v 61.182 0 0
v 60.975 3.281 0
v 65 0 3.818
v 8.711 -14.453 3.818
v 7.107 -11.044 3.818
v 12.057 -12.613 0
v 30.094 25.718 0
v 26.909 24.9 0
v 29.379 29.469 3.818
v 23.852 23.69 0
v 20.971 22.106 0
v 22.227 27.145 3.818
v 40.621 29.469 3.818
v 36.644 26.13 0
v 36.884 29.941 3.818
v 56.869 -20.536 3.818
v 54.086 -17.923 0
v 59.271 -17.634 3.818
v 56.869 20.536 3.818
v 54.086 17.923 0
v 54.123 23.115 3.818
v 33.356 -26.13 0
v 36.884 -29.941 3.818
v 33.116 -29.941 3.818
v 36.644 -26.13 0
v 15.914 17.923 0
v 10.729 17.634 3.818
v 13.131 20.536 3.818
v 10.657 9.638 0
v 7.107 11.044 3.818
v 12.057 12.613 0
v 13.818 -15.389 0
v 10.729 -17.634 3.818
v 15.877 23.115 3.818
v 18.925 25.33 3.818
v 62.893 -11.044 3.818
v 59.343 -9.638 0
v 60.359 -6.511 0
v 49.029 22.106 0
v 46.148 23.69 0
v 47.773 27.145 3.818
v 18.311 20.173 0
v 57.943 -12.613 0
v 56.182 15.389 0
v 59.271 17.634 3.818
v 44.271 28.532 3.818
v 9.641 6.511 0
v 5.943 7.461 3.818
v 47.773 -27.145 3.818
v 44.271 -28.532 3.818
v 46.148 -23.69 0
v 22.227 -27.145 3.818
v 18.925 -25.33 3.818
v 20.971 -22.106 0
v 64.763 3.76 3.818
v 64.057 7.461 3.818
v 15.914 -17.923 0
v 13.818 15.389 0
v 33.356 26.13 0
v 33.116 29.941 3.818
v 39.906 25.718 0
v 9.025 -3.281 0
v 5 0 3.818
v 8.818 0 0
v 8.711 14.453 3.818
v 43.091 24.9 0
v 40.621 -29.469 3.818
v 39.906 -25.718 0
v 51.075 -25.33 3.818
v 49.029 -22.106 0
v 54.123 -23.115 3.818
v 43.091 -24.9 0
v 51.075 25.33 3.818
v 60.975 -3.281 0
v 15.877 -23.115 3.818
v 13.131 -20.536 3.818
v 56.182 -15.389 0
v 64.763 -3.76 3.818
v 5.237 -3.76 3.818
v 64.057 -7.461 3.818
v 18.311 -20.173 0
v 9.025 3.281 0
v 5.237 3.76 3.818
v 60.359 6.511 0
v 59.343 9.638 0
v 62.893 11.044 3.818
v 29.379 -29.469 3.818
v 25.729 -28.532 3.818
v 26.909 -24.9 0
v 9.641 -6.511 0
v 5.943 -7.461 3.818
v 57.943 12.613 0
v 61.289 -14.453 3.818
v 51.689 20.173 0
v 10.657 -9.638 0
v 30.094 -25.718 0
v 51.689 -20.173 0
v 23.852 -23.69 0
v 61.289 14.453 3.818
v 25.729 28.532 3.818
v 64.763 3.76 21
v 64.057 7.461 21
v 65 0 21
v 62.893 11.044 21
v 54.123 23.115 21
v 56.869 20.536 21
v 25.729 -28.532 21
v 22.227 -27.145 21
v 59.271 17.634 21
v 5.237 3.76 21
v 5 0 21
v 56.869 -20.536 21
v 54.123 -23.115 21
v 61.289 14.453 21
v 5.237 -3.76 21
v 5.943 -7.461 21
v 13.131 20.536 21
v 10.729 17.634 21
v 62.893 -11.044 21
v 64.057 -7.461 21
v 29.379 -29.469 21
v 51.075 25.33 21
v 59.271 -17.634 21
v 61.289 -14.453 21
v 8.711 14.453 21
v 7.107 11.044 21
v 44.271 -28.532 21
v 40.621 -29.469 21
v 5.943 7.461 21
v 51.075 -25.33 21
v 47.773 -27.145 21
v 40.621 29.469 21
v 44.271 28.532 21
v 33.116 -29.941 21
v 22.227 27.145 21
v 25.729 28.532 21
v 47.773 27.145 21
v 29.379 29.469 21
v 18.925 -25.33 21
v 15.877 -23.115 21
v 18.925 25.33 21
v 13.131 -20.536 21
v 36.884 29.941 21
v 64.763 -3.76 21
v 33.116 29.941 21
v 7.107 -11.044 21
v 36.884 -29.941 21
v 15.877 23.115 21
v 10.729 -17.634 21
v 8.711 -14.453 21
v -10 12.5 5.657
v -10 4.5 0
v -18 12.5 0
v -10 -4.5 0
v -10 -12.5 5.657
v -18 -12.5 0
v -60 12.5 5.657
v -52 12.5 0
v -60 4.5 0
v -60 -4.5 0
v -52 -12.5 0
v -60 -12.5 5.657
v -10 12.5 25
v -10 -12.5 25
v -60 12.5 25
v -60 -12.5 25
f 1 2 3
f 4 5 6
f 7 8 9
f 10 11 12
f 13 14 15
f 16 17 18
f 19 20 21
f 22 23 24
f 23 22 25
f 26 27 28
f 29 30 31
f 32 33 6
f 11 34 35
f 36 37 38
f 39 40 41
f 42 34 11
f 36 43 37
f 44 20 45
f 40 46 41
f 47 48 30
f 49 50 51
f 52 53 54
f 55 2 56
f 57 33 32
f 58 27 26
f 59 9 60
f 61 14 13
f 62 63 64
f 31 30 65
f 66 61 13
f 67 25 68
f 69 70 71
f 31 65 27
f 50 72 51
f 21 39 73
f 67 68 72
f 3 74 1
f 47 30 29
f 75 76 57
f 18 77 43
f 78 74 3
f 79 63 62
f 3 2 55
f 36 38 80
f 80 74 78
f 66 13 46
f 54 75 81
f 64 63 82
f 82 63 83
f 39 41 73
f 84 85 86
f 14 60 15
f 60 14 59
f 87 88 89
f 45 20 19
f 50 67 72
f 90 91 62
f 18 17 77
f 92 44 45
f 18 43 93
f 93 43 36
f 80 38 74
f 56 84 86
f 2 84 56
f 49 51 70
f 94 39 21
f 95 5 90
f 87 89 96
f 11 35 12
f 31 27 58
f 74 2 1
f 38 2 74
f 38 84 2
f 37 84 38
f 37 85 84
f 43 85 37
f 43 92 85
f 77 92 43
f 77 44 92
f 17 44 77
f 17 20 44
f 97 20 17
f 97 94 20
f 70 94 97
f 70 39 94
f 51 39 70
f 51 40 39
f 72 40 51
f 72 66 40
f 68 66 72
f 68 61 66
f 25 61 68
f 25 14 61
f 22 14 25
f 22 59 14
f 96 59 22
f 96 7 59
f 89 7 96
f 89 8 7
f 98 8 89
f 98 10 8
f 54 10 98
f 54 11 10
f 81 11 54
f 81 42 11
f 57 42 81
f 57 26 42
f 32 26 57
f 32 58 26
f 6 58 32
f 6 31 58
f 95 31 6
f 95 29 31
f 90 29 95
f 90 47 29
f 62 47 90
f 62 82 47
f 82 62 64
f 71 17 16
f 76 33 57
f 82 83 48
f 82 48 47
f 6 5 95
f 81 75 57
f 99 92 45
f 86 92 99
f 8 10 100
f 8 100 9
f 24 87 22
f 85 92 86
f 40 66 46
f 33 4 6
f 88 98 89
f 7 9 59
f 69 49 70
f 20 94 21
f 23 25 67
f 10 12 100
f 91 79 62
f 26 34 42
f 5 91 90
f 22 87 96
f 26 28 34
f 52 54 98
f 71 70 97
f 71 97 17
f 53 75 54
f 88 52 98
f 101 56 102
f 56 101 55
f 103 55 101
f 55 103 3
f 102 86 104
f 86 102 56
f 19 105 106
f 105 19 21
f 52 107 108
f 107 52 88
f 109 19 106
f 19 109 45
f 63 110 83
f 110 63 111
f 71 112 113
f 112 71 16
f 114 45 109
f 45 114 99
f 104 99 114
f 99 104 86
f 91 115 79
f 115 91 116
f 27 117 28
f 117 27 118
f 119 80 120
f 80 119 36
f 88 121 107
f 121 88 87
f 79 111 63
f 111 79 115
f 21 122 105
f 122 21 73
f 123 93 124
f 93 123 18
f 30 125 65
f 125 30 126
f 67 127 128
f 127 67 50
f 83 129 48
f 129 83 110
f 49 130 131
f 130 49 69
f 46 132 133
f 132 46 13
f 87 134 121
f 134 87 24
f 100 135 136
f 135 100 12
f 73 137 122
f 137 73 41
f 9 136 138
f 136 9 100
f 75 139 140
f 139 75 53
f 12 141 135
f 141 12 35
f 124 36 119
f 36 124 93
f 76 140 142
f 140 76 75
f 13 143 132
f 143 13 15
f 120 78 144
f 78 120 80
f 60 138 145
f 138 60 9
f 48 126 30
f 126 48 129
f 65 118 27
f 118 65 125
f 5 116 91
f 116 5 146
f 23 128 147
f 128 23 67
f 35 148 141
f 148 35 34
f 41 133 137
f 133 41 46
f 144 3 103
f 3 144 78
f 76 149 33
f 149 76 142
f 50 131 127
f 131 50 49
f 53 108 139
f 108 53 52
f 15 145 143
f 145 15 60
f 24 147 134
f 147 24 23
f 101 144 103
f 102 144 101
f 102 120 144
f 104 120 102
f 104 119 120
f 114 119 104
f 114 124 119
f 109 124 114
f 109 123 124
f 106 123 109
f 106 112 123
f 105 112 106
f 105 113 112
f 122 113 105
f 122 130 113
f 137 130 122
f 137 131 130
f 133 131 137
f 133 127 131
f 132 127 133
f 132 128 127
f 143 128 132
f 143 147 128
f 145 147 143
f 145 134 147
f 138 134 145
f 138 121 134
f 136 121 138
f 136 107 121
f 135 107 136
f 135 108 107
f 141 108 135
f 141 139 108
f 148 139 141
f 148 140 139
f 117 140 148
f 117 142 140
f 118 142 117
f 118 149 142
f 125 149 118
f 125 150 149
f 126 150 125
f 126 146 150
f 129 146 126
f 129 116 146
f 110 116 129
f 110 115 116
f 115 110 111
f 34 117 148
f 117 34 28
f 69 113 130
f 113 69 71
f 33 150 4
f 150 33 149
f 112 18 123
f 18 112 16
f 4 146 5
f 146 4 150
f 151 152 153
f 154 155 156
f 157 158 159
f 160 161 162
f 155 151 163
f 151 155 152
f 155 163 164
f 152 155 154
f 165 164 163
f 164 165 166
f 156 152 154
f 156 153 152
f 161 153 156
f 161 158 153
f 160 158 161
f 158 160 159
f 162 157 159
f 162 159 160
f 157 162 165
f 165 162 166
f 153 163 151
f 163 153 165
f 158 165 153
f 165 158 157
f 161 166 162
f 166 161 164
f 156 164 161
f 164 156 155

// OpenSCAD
// file: ../utilities/transformations_oblomobka.scad
// Transformations
// (C) @oblomobka - 2014
// GPL3

// Transforma una forma en un sector según un ángulo dado.

module sector(	angle, 	// es el ángulo del sector, lo que quedará de la forma original
				d,		// valor auxiliar, será como mínimo igual al diámetro del cilindro que envuelve la forma original
				h		// valor auxiliar, será como mínimo igual a la altura del cilindro que envuelve la forma original
				){

POINTS=[	[0,0,-h],
		[0,0,h],
		[d*cos(0*angle/4),d*sin(0*angle/4),-h],
		[d*cos(0*angle/4),d*sin(0*angle/4),h],
		[d*cos(1*angle/4),d*sin(1*angle/4),-h],
		[d*cos(1*angle/4),d*sin(1*angle/4),h],
		[d*cos(2*angle/4),d*sin(2*angle/4),-h],
		[d*cos(2*angle/4),d*sin(2*angle/4),h],
		[d*cos(3*angle/4),d*sin(3*angle/4),-h],
		[d*cos(3*angle/4),d*sin(3*angle/4),h],
		[d*cos(4*angle/4),d*sin(4*angle/4),-h],
		[d*cos(4*angle/4),d*sin(4*angle/4),h],
		];

TRIANGLES=[	[0,1,2],
			[1,3,2],
			[2,3,4],
			[3,5,4],
			[4,5,6],
			[5,7,6],
			[6,7,8],
			[7,9,8],
			[8,9,10],
			[9,11,10],
			[10,11,0],
			[11,1,0],

			[5,3,1],
			[7,5,1],
			[9,7,1],
			[11,9,1],
			[0,2,4],
			[0,4,6],
			[0,6,8],
			[0,8,10]
			];

if(angle<=0 || angle>=360){
	child();
	}
	else{
		intersection(){
			polyhedron(points=POINTS,triangles=TRIANGLES);
			child();
			}
		}
}

//sector (150,40,10)cylinder(r=20,h=10); // Ejemplo de uso de la tansformación sector()
// file: ../utilities/functions_ext.scad
// Funciones sacadas de otras librerías y de diferentes autores

include <constants_oblomobka.scad>

/* A circular helix of radius a and pitch 2πb is described by the following parametrisation:
x(t) = a*cos(t),
y(t) = a*sin(t),
z(t) = b*t
Licensed under the MIT license.
© 2010 by Elmo Mäntynen
*/
function b(pitch) = pitch/(TAU);
function t(pitch, z) = z/b(pitch);
function helix_curve(pitch, radius, z) = [radius*cos(deg(t(pitch, z))), radius*sin(deg(t(pitch, z))), z];


/* Utility functions.
 * Originally by Hans Häggström, 2010.
 * Dual licenced under Creative Commons Attribution-Share Alike 3.0 and LGPL2 or later
 */
function distance(a, b) = sqrt( (a[0] - b[0])*(a[0] - b[0]) +
                                (a[1] - b[1])*(a[1] - b[1]) +
                                (a[2] - b[2])*(a[2] - b[2]) );

function length2(a) = sqrt( a[0]*a[0] + a[1]*a[1] );

function normalized(a) = a / (max(distance([0,0,0], a), 0.00001));

function normalized_axis(a) = 	a == "x" ? [1, 0, 0]:
                  			 	a == "y" ? [0, 1, 0]:
                   				a == "z" ? [0, 0, 1]: normalized(a);

function angleOfNormalizedVector(n) = [0, -atan2(n[2], length2([n[0], n[1]])), atan2(n[1], n[0]) ];

function angle(v) = angleOfNormalizedVector(normalized(v));

function angleBetweenTwoPoints(a, b) = angle(normalized(b-a));
// file: ../utilities/constants_oblomobka.scad
// números transcendentes

TAU = 2*PI; //6.2831853071 (PI ya está definido en Openscad)
EULER=2.71828282;


// números algebraicos

PHI=(1+sqrt(5))/2;


// Vectores

X = [1, 0, 0];
Y = [0, 1, 0];
Z = [0, 0, 1];
// file: ../utilities/shapes_oblomobka.scad
// Shapes
// (C) @oblomobka - 2014
// GPL3

include <constants_oblomobka.scad>
include <functions_oblomobka.scad>
include <functions_ext.scad>

use <transformations_oblomobka.scad>

// --- Piramide con base circunscrita en un círculo definido en las variables
module pyramid_circumscribed (	n=4,			// nº lados de la base de la pirámide	
								d1=20,		// diámetro del círculo-base donde se circunscribe la pirámide
								d2=0,		// diámetro del círculo-punta donde se circunscribe la pirámide
								h=10			// altura de la pirámide
								){

if(n%2==0){
	rotate([0,0,180/n])
		cylinder (r1=d1/2/cos(180/n), r2=d2/2/cos(180/n), h=h, $fn=n);
	}
	else{
		rotate([0,0,90/n])
			cylinder (r1=d1/2/cos(180/n), r2=d2/2/cos(180/n), h=h, $fn=n);
		}

}
// ------- pyramid_circumscribed (n=n,d1=d1,d2=d2,h=h); -----------------

// --- Prisma con base circunscrita en un círculo definido en las variables
module prism_circumscribed (	n=4,			// nº lados de la base del prisma
							d=20,		// diámetro del círculo donde se circunscribe el prisma
							h=10			// altura del prisma
							){
if(n%2==0){
	rotate([0,0,180/n])
		cylinder (r=d/2/cos(180/n), h=h, $fn=n);
	}
	else{
		rotate([0,0,90/n])
			cylinder (r=d/2/cos(180/n), h=h, $fn=n);
		}
}
// ------- prism_circumscribed (n=n,d=d,h=h); -----------------



// Toros

// Definido por el diámetro exterior y el diámetro del círculo en revolución
module torusOD (d1,d2,resolution){
$fn=resolution;	
rotate_extrude(){
	translate([d1/2-d2/2,0,0])
		circle(r=d2/2);
	}
}

// Definido por el diámetro exterior y el diámetro interior
module torusOI (d1,d2,resolution){
$fn=resolution;	
d=(d1-d2)/2;
rotate_extrude(){
	translate([d1/2-d/2,0,0])
		circle(r=d/2);
	}
}

// Definido por el diámetro de la línea neutra y el diámetro del círculo en revolución
module torusND (d1,d2,resolution){
$fn=resolution;	
rotate_extrude(){
	translate([d1/2,0,0])
		circle(r=d2/2);
	}
}

module torus_sector(d1,d2,angle=360,mode=1,extreme=true,resolution=32){

if(angle<=0 || angle>=360){
	if(mode==1){torusOD(d1,d2,resolution=resolution);}
	else{if(mode==2){torusND(d1,d2,resolution=resolution);}
	else{if(mode==3){torusOI(d1,d2,resolution=resolution);}}}
	}

else{
	if(mode==1){
		union(){
			sector(angle,d1,d2/2)torusOD(d1,d2,resolution=resolution);
			if(extreme==true){
				translate([d1/2-d2/2,0,0])sphere(d2/2,$fn=resolution);
				translate([(d1/2-d2/2)*cos(angle),(d1/2-d2/2)*sin(angle),0])sphere(d2/2,$fn=resolution);
				}
			}
		}
	else{
		if(mode==2){
			union(){
				sector(angle,d1+d2,d2/2)torusND(d1,d2,resolution=resolution);
				if(extreme==true){
					translate([d1/2,0,0])sphere(d2/2,$fn=resolution);
					translate([d1/2*cos(angle),d1/2*sin(angle),0])sphere(d2/2,$fn=resolution);
					}
				}
			}
		else{
			if(mode==3){
				union(){
					sector(angle,d1,(d1-d2)/4)torusOI(d1,d2,resolution=resolution);
					if(extreme==true){
						translate([d1/2-(d1-d2)/4,0,0])sphere((d1-d2)/4,$fn=resolution);
						translate([(d1/2-(d1-d2)/4)*cos(angle),(d1/2-(d1-d2)/4)*sin(angle),0])sphere((d1-d2)/4,$fn=resolution);
						}
					}
				}
			}
		}
	}
}


// Tubos

module tubeOT (d,t,h,resolution=resolution){	
	difference(){
		cylinder(r=d/2,h=h,$fn=resolution);
		cylinder(r=(d-2*t)/2,h=3*h,center=true,$fn=resolution);
		}
}

// Definido por el diámetro exterior y el diámetro interior
module tubeOI (d1,d2,h,resolution=resolution){
	difference(){
		cylinder(r=d1/2,h=h,$fn=resolution);
		cylinder(r=d2/2,h=3*h,center=true,$fn=resolution);	
		}
}

// Definido por el diámetro de la línea neutra y el diámetro del círculo en revolución
module tubeNT (d,t,h,resolution=resolution){
	difference(){
		cylinder(r=(d+t)/2,h=h,$fn=resolution);
		cylinder(r=(d-t)/2,h=3*h,center=true,$fn=resolution);
	}
}

module tube_sector(d=25,t=2,h=1,angle=360,mode=1,extreme=true,resolution=32){

if(angle<=0 || angle>=360){
	if(mode==1){tubeOT(d,t,h,resolution=resolution);}
	else{if(mode==2){tubeNT(d,t,h,resolution=resolution);}
	else{if(mode==3){tubeOI(d,t,h,resolution=resolution);}}}
	}

else{
	if(mode==1){
		union(){
			sector(angle,d,h)tubeOT(d,t,h,resolution=resolution);
			if(extreme==true){
				translate([d/2-t/2,0,0])cylinder(r=t/2,h=h,$fn=resolution);
				translate([(d/2-t/2)*cos(angle),(d/2-t/2)*sin(angle),0])cylinder(r=t/2,h=h,$fn=resolution);;
				}
			}
		}
	else{
		if(mode==2){
			union(){
				sector(angle,d+t,h)tubeNT(d,t,h,resolution=resolution);
				if(extreme==true){
					translate([d/2,0,0])cylinder(r=t/2,h=h,$fn=resolution);
					translate([d/2*cos(angle),d/2*sin(angle),0])cylinder(r=t/2,h=h,$fn=resolution);
					}
				}
			}
		else{
			if(mode==3){
				union(){
					sector(angle,d,h)tubeOI(d,t,h,resolution=resolution);
					if(extreme==true){
						translate([d/2-(d-t)/4,0,0])cylinder(r=(d-t)/4,h=h,$fn=resolution);
						translate([(d/2-(d-t)/4)*cos(angle),(d/2-(d-t)/4)*sin(angle),0])cylinder(r=(d-t)/4,h=h,$fn=resolution);
						}
					}
				}
			}
		}
	}
}

//torus_sector(d1=15,d2=4,angle=215,mode=3,extreme=true,resolution=50);
//tube_sector(d=24,t=11,h=15,angle=250,mode=1,extreme=true,resolution=50);

pyramid_circumscribed(n=10,d=8,h=4);
// file: ../utilities/functions_oblomobka.scad
// Functions
// (C) @oblomobka - 2014
// GPL3

include <constants_oblomobka.scad>

// da el diámetro interior del cono(d1,d2,h) a una altura interior(hi) conocida
function di_cone(d1,d2,h,hi)=d2+(d1-d2)*(1-hi/h);

// da la altura interior del cono(d1,d2,h) a un diametro(di) conocido
function hi_cone(d1,d2,h,di)=-h*((di-d2)/(d1-d2)-1);

// 
function r_circle_intersection (d1,d2)=sqrt(pow(d1/2,2)-pow(d2/2,2));

// Relaciones entre radio, apotema y lado en un polígono de n lados
function side_apothem (apothem,n)=apothem*2*tan(180/n);
function apothem_radius(radius,n)=radius*cos(180/n);
function radius_apothem(apothem,n)=apothem/cos(180/n);
function side_radius (radius,n)=radius*2*sin(180/n);

// limita los posibles valores de x, que siempre estarán comprendidos entre un minimo(a) y un maximo(z)
function lim(a,x,z)=max(a,min(x,z));

// transforma angulo, radianes --> hexadecimal
function deg(angle) = 180*angle/PI;
// transforma angulo, hexadecimal --> radianes
function rad(angle) = angle*PI/180;
// file: ../utilities/limits_oblobots.scad
//PIN
	d_pin_minmax=[10,30];			//	d_pin=lim(d_pin_minmax[0],pin[0],d_pin_minmax[1]);			
	h_pin_minmax=[0,10];			//	h_pin=lim(h_pin_minmax[0],pin[1],h_pin_minmax[1]);

//LEGS & FOOTS
	d_leg_minmax=[10,30];			//	d_leg=lim(d_leg_minmax[0],leg[0],d_leg_minmax[1]);
	h_leg_minmax=[20,90];			//	h_leg=lim(h_leg_minmax[0],leg[1],h_leg_minmax[1]);	
	n_leg_minmax=[4,16];			//	n_leg=lim(n_leg_minmax[0],leg[2],n_leg_minmax[1]);
	legsposition_minmax=[0,100];	// 	legsposition=lim(legsposition_minmax[0],leg[1],legsposition_minmax[1]);

	l_foot_minmax=[24,70];		//	l_foot=lim(l_foot_minmax[0],foot[0],l_foot_minmax[1]);
	h_foot_minmax=[0,40];			//	h_foot=lim(h_foot_minmax[0],foot[1],h_foot_minmax[1]);

//HIP | WAIST
	//C
	d_hip_minmax=[25,80];			//	d_hip=lim(d_hip_minmax[0],hip[0],d_hip_minmax[1]);
	h_hip_minmax=[10,70];			//	h_hip=lim(h_pin+2,hip[1],h_hip_minmax[1]);
	f_hip_minmax=[0,100];			//	f_hip=lim(f_hip_minmax[0],hip[2],f_hip_minmax[1]);

								//	d1_waist=lim(d_pin,waist[0],d_hip);
								//	d2_waist=lim(d_pin,waist[1],d1_waist);
	h_waist_minmax=[0.3,20];		//	h_waist=lim(h_waist_minmax[0],waist[2],h_waist_minmax[1]);

	
	//Q
	x_hip_minmax=[20,90];			//	x_hip=lim(x_hip_minmax[0],hip[0],x_hip_minmax[1]);
	y_hip_minmax=[20,60];			//	y_hip=lim(y_hip_minmax[0],hip[1],y_hip_minmax[1]);
	z_hip_minmax=[10,60];			//	z_hip=lim(z_hip_minmax[0],hip[2],z_hip_minmax[1]);
	bevel_hip_minmax=[0.5,20];	//	bevel_hip=lim(bevel_hip_minmax[0],hip[3],bevel_hip_minmax[1]);

	n_waist_minmax=[4,50];		//	n_waist=lim(n_waist_minmax[0],waist[3],n_waist_minmax[1]);
								//	d1_waist=lim(d_pin,waist[0],min(x_hip,y_hip));
								//	d2_waist=lim(d_pin,waist[1],d1_waist);


//TRUNK | SHOULDER | NECK
	//C
	d1_trunk_minmax=[30,100];		//	d1_trunk=lim(d1_trunk_minmax[0],trunk[0],d1_trunk_minmax[1]); 
	d2_trunk_minmax=[30,100];		//	d2_trunk=lim(d2_trunk_minmax[0],trunk[1],d1_trunk);
	h_trunk_minmax=[24,100];		//	h_trunk=lim(h_trunk_minmax[0],trunk[2],h_trunk_minmax[1]);

	d1_shoulder_minmax=[12,50];	//	d1_shoulder=lim(d1_shoulder_minmax[0],shoulder[0],h_trunk*sin(angle_trunk));
	d_aux_shoulder_minmax=[0,10];	//	d_aux_shoulder=lim(d_aux_shoulder_minmax[0],shoulder[1],d_aux_shoulder_minmax[1]);
	h_shoulder_minmax=[0,50];		//	h_shoulder=lim(h_shoulder_minmax[0],shoulder[2],d2_trunk/2);

								//	d1_neck=lim(d_pin+2,neck[0],d2_trunk);
								//	d2_neck=lim(d_pin+2,neck[1],d1_neck);
	h_neck_minmax=[0.3,20];		//	h_neck=lim(h_neck_minmax[0],neck[2],h_neck_minmax[1]);

	//Q
	x_trunk_minmax=[20,90];		//	x_trunk=lim(x_trunk_minmax[0],trunk[0],x_trunk_minmax[1]);
	y_trunk_minmax=[20,90];		//	y_trunk=lim(d_pin+1+x_trunk/5,trunk[1],y_trunk_minmax[1]);
	z_trunk_minmax=[26,90];		//	z_trunk=lim(z_trunk_minmax[0],trunk[2],z_trunk_minmax[1]);
	
	n_neck_minmax=[4,50];			//	n_neck=lim(n_neck_minmax[0],neck[3],n_neck_minmax[1]);
								//	d1_neck=lim(d_pin+2,neck[0],min(x_trunk,y_trunk));	
								//	d2_neck=lim(d_pin+2,neck[1],d1_neck);

	//ELECTRIC TRUNK
	d_polygonal_trunk_minmax=[45,80];	//d_polygonal_trunk=lim(d_polygonal_trunk_minmax[0],trunk[0],d_polygonal_trunk_minmax[1]);							
	h_polygonal_trunk_minmax=[87,120];	//h_polygonal_trunk=lim(h_polygonal_trunk_minmax[0],trunk[1],h_polygonal_trunk_minmax[1]);
	thickness_trunk_minmax=[1,6];	//thickness_trunk=lim(thickness_trunk_minmax[0],trunk[2],thickness_trunk_minmax[1]);

// ARMS | HANDS
	// C
	d_arm_minmax=[10,40];			// 	d_arm=lim(d_arm_minmax[0],arm[0],d_arm_minmax[1]);
								//	d_arm=lim(d_pin+1,arm[0],d_arm_minmax[1]);	
	h_arm_minmax=[5,25];			// 	h_arm=lim(h_arm_minmax[0],arm[1],h_arm_minmax[1]);
	armpit_minmax=[0.3,60];		//	armpit=lim(armpit_minmax[0],arm[2],armpit_minmax[1]);
	l_arm_minmax=[20,120];		// 	l_arm=lim(d_arm+d_hand,arm[2],l_arm_minmax[1]);	

	d_hand_minmax=[10,60];		//	d_hand=lim(d_hand_minmax[0],hand[0],d_hand_minmax[1]);
	h_hand_minmax=[3,25];			//	h_hand=lim(h_hand_minmax[0],hand[1],h_arm-0.5);
	angle_hand_minmax=[0,180];	//	angle_hand=lim(angle_hand_minmax[0],hand[2]/2,angle_hand_minmax[1]);

	// Q
	x_arm_minmax=[5,25];			// 	x_arm=lim(x_arm_minmax[0],arm[1],x_arm_minmax[1]);
	y_arm_minmax=[10,40];			// 	y_arm=lim(y_arm_minmax[0],arm[0],y_arm_minmax[1]);
	z_arm_minmax=[20,120];		//	z_arm=lim(y_arm+5+d_hand,arm[2],z_arm_minmax[1]);

	n_hand_minmax=[4,12];			// 	n_hand=lim(n_hand_minmax[0],2*floor(hand[2]/2),n_hand_minmax[1]);
								//	h_hand=lim(h_hand_minmax[0],hand[1],x_arm-0.5);

// HEAD | EYES | BRAIN
	// C
	h_head_minmax=[20,100];		// 	h_head=lim(h_head_minmax[0],head[2],h_head_minmax[1]);
	d1_head_minmax=[20,60];		// 	d1_head=lim(h_head_minmax[0],head[0],h_head_minmax[1]);
	d2_head_minmax=[15,150];		// 	d2_head=lim(h_head_minmax[0],head[1],2*h_head+d1_head);

	// Q
	x_head_minmax=[20,100];		// x_head=lim(x_head_minmax[0],head[0],x_head_minmax[1]);
	y_head_minmax=[20,100];		// y_head=lim(y_head_minmax[0],head[1],y_head_minmax[1]);
	z_head_minmax=[20,100];		// z_head=lim(z_head_minmax[0],head[2],z_head_minmax[1]);

	d_eye_minmax=[5,40];			// 	d_eye=lim(d_eye_minmax[0],eye[0],(d1_head+d2_head)/2);
	h_eye_minmax=[1,10];			// 	h_eye=lim(h_eye_minmax[0],eye[1],h_eye_minmax[1]);
	edge_eye_minmax=[1,12];		//	edge_eye=lim(edge_eye_minmax[0],eye[2],d_eye/2-3);

	frown_eye_expression_minmax=[0,100];		// frown_eye_expression=lim(frown_eye_expression_minmax[0],eye_expression[1],frown_eye_expression_minmax[1]);
	bridge_eye_position_minmax=[0,100];		// bridge_eye_position=lim(bridge_eye_position_minmax[0],eye_position[0],bridge_eye_position_minmax[1]);	
	f_h_eye_position_minmax=[0,100];			// f_h_eye_position=lim(f_h_eye_position_minmax[0],eye_position[1],f_h_eye_position_minmax[1]);	

	h_brain_minmax=[0,40];			//	h_brain=lim(h_brain_minmax[0],brain[0],h_brain_minmax[1]);
	edge_brain_minmax=[0,25];			//	edge_brain=lim(edge_brain_minmax[0],brain[1],edge_brain_minmax[1]);

//BADGE
	d_badge_minmax=[20,40];		//	d_badge=lim(d_badge_minmax[0],badge[0],d_badge_minmax[1])
	h_badge_minmax=[0.5,5];		// 	h_badge=lim(h_badge_minmax[0],badge[1],h_badge_minmax[1]);
	n_badge_minmax=[4,50];		// 	n_badge=lim(n_badge_minmax[0],badge[3],n_badge_minmax[1]);
	edge_badge_minmax=[1,5];		//	edge_badge=lim(edge_badge_minmax[0],badge[2],edge_badge_minmax[1]);
// file: ../utilities/presets_oblobots.scad
//////////////////////////////////////////////////////////////////////////////////////////////////
// presets [OBLOBOTS] 
// valores predeterminados para los volúmenes de un oblobot así como de los modos de represntación
//////////////////////////////////////////////////////////////////////////////////////////////////
// (c) Jorge Medal (@oblomobka) - Sara Alvarellos (@trecedejunio) Oct 2013
//////////////////////////////////////////////////////////////////////////////////////////////////
// GPL license
//////////////////////////////////////////////////////////////////////////////////////////////////

use <functions_oblomobka.scad>


//-- CARACTERÍSTICAS DEL PIN

SIMPLE=[0,0,0];					// cilindro 

	// Pestañas en pin con punta expandible
	tab_expansion=80;
	TABWIDE=[35,35,tab_expansion];
	TABNORMAL=[50,50,tab_expansion];
	TABFINE=[65,65,tab_expansion];

/////////////////////////////////////////////
/////// REPRESENTACIÓN //////////////////////
/////////////////////////////////////////////

//-- MODOS DE REPRESENTACIÓN DE LAS PARTES 

ASSEMBLED=[0,1,0,0];
EXPLOSION=[0,1,1,1];
PRINTING=[1,0,0,2];


//-- ELECCIÓN DE LA PARTE REPRESENTADA	

ALL=[0];
LEGS=[1];
HIP=[2];
TRUNK=[3];
HEAD=[4];
ARMS=[5];
BADGES=[6];

//-- COLORES

arms_color=[1,rands(100,200,1)[0]/255,0];
legs_color=[0,rands(100,200,1)[0]/255,1];
trunk_color=[rands(0,100,1)[0]/255,rands(150,225,1)[0]/255,rands(0,100,1)[0]/255];
head_color=[220/255,rands(0,100,1)[0]/255,20/255];
badges_color=[rands(0,255,1)[0]/255,rands(0,255,1)[0]/255,rands(0,255,1)[0]/255];
hip_color=[0,(rands(100,200,1)[0])/255,1];
// file: ../utilities/external_elements_oblobots.scad
//////////////////////////////////////////////////////////////////////////////////////////////////
// external elements [OBLOBOTS] 
// librería de elementos externos comerciales (botones automáticos, espigas de madera baterías, ...) 
// que se usan en las partes de los oblobots
//////////////////////////////////////////////////////////////////////////////////////////////////
// (c) Jorge Medal (@oblomobka) - Sara Alvarellos (@trecedejunio) 2014-02
//////////////////////////////////////////////////////////////////////////////////////////////////
// GPL license
//////////////////////////////////////////////////////////////////////////////////////////////////

//-- BOTONES AUTOMÁTICOS - Press Fastener (PF)
//-- Cada código corresponde a las medidas de un modelo concreto

//XXX= [ xx,xx,xx,xx,xx,xx,xx ];		// [ 	diametro hembra,
									//		espesor hembra,
									//		diámetro alojamiento en hembra (aparece en los botones para coser),
									//		saliente del alojamiento en hembra (aparece en los botones para coser),
									//		diámetro macho,
									//		espesor macho	
									//		tipo]

NULL=[0,0,0,0,0,0,0];				// no hay botón automático 
//PON = [11.7,2.35,0,0,11.7,1.6 ];	// marca desconocida, encontrado en Pontejos (Madrid)
//PRYM10 = [11,2.2,0,0,11,2.0];		// marca PRYM - 10 mm
PRYM_SNAP_FASTENERS_11 = [10.1,1.4,3.5,3,9.1,1,2];	// marca PRYM - Snap fasteners 11mm
PRYM_SNAP_FASTENERS_9 = [8.5,1.5,3,2.7,8.1,1,2];	// marca PRYM - Snap fasteners 9mm

fit_male=0.7;

//-- Espigas de madera - DOWEL

DOWEL_8=[8,40,0,0,0,0,1];
DOWEL_6=[6,30,0,0,0,0,1];

//-- TUBOS DE PLÁSTICO

PIPE_6=[6,20,0,0,0,0,1];



//-- BATERÍAS CILÍNDRICAS

//XX= [ xx,xx ];		// [ 	diametro de la pila,
					//		longitud	de la pila	]

AA = [ 14.5, 50.5 ];
AAA = [ 10.5,44.5 ];
C = [ 26.2, 50 ];
D = [ 34.2, 61.5 ]; 
// main file
//////////////////////////////////////////////////////////////////////////////////////////////////
// HIP[OBLOBOTS] 
// preform
//////////////////////////////////////////////////////////////////////////////////////////////////
// (c) Jorge Medal (@oblomobka) - Sara Alvarellos (@trecedejunio) 2014-04 v.10
//////////////////////////////////////////////////////////////////////////////////////////////////
// GPL license
//////////////////////////////////////////////////////////////////////////////////////////////////

include <../utilities/external_elements_oblobots.scad>
include <../utilities/presets_oblobots.scad>
include <../utilities/limits_oblobots.scad>

use <../utilities/functions_oblomobka.scad>
use <../utilities/shapes_oblomobka.scad>


//////////////////////////////////////////////////////////////////
/////////////////// MODULO hip_cylindrical  //////////////////////

module hip_cylindrical(hip=[40,15,80]){	// [ d,h,f ] Medidas de la cadera

// valores con límites: acotados entre un máximo y un mínimo (los valores límite están en <limits_oblobots.scad>)
d_hip=lim(d_hip_minmax[0],hip[0],d_hip_minmax[1]);
h_hip=lim(h_hip_minmax[0],hip[1],h_hip_minmax[1]);
f_hip=lim(f_hip_minmax[0],hip[2],f_hip_minmax[1]);

// variables condicionadas a los valores de entrada
h1_hip=h_hip-f_hip*h_hip/110;
h2_hip=h_hip-h1_hip;

d1_hip=max(3*d_hip/4,(d_hip-2*h1_hip));  // diámetro inferior de la cadera

$fn=50;

// --------- Volumen ----------------

union(){
	cylinder(r1=d1_hip/2,r2=d_hip/2,h=h1_hip);
	translate([0,0,h1_hip])
		cylinder (r=d_hip/2,h=h2_hip);	
	}
}
// -------------- Fin del módulo hip_cylindrical() ------------------------
// ------------------------------------------------------------------------


//////////////////////////////////////////////////////////////////
/////////////////// MÓDULO hip_quadrangle()  /////////////////////

module hip_quadrangle (hip=[40,22,18,3]){			// [ ancho(x), fondo(y), altura(z), chaflán ] Medida de la cadera


x_hip=lim(x_hip_minmax[0],hip[0],x_hip_minmax[1]);			// medida de la cadera: ancho
y_hip=lim(y_hip_minmax[0],hip[1],y_hip_minmax[1]);			// medida de la cadera: fondo
z_hip=lim(z_hip_minmax[0],hip[2],z_hip_minmax[1]);			// medida de la cadera: alto
bevel_hip=lim(bevel_hip_minmax[0],hip[3],bevel_hip_minmax[1]);;		// medida de la cadera: chaflán

// Volumen
difference(){
	translate([0,0,z_hip/2])
		cube ([x_hip,y_hip,z_hip],center=true);
	for(i=[	[1,1,0],
			[1,-1,-90],
			[-1,1,90],
			[-1,-1,180]]){
		translate([i[0]*x_hip,i[1]*y_hip,0]/2)
			rotate([0,0,i[2]])rotate(45*[0,1,1])
				cube([min(2*bevel_hip,((y_hip-1)/2)),x_hip,x_hip],center=true);
		}
	}
}
// ------------ Fin del módulo hip_quadrangle(hip[x,y,z,b]) -------------
// ----------------------------------------------------------------------


/////////////////////////////////////////////////////////////////////////
/////////////////// Ejemplos de aplicación //////////////////////////////

i=35;

translate([i,0,0])
	hip_cylindrical(hip=[60,21,90]);

translate([-i,0,0])
	hip_quadrangle(hip=[50,25,25,4]);
